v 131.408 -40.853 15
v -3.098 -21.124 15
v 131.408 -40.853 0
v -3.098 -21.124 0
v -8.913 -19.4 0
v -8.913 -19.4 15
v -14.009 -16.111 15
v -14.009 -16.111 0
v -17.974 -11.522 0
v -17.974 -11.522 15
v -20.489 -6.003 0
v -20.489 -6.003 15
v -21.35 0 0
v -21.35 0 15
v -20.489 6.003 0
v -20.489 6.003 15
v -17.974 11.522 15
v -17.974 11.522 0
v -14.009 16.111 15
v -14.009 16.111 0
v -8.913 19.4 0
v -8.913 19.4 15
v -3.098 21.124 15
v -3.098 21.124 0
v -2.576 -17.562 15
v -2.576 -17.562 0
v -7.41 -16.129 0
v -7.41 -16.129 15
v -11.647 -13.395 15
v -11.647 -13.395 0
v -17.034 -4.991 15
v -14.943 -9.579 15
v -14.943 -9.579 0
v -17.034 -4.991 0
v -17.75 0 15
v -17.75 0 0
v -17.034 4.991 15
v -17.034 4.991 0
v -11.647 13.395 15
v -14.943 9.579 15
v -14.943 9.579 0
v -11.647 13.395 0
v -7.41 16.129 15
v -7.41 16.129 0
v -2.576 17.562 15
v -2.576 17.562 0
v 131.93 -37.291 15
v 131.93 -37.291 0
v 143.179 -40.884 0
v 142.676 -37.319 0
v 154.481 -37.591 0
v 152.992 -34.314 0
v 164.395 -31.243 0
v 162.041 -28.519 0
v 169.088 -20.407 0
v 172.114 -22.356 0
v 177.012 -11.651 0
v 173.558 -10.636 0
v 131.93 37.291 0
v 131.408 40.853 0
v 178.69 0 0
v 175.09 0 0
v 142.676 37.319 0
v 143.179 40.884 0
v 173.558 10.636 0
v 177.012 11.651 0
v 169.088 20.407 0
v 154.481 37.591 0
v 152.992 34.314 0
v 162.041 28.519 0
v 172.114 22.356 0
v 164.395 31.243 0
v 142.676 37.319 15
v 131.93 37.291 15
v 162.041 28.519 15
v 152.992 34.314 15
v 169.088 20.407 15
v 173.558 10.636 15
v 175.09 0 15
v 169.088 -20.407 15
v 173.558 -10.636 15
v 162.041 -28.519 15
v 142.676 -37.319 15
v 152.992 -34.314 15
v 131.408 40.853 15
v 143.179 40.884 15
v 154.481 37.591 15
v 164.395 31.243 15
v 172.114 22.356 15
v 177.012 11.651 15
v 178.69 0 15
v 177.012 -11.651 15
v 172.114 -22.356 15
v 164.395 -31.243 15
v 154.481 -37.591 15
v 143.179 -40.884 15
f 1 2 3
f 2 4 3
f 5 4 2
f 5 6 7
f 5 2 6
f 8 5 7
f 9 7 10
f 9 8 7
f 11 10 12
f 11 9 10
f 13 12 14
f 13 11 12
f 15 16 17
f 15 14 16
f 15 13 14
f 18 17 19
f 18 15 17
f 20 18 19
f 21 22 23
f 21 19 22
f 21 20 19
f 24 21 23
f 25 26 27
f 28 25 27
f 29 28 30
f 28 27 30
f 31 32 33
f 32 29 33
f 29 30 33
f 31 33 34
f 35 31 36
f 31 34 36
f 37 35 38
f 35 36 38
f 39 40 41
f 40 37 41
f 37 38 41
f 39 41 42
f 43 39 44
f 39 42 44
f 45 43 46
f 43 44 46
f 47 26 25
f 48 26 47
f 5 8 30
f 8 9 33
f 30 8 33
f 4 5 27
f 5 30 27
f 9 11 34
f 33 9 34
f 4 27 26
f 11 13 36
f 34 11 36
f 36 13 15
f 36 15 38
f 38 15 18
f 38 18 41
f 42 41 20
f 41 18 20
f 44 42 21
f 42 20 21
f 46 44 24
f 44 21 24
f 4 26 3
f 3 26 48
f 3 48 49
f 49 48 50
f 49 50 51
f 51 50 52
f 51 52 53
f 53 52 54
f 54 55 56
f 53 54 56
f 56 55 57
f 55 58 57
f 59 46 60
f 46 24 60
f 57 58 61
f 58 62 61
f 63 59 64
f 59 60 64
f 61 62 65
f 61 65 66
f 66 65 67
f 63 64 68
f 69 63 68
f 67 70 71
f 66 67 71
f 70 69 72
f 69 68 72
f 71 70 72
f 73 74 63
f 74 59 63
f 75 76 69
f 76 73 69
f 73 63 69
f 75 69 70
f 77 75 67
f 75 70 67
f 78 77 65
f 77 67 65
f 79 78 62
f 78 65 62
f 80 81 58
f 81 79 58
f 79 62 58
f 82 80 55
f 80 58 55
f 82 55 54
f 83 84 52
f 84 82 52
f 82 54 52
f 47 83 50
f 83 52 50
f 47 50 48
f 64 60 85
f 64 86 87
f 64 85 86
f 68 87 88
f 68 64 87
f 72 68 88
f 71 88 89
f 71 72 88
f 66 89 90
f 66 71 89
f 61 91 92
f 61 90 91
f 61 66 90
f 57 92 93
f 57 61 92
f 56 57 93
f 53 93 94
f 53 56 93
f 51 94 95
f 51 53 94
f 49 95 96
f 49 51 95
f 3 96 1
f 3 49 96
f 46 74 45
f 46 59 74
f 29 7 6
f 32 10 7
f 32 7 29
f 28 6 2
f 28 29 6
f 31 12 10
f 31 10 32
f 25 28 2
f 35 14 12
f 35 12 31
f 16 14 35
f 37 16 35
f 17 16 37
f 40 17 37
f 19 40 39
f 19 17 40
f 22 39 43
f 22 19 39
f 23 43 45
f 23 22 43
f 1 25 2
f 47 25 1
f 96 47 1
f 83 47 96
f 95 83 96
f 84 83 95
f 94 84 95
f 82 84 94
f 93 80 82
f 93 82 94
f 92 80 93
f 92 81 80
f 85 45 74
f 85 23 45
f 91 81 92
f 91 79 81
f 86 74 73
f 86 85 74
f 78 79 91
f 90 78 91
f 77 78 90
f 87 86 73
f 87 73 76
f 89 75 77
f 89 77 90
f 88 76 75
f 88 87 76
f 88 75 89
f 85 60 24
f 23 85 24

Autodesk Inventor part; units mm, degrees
ref_plane "YZ Plane" through (0, 0, 0) normal (1, 0, 0) x (0, 1, 0)
ref_plane "XZ Plane" through (0, 0, 0) normal (0, 1, 0) x (-1, 0, 0)
ref_plane "XY Plane" through (0, 0, 0) normal (0, 0, 1) x (1, 0, 0)
sketch "Sketch1" plane through (0, 0, 0) normal (0, 0, 1) x (1, 0, 0)
  arc A0 (-2.8807, 19.6399) -> (-2.8807, -19.6399) centre (0, 0) ccw
  arc A1 (131.6255, -39.3688) -> (131.6255, 39.3688) centre (137.4, 0) ccw
  line L0 (0, 0) -> (137.4, 0)
  line L1 (0, 0) -> (137.4, 0) construction
  line L2 (-2.8807, 19.6399) -> (131.6255, 39.3688)
  line L3 (-2.8807, -19.6399) -> (131.6255, -39.3688)
  arc A2 (131.9303, -37.291) -> (131.9303, 37.291) centre (137.4, 0) ccw
  line L4 (131.9303, 37.291) -> (-2.5759, 17.5621)
  arc A3 (-2.5759, 17.5621) -> (-2.5759, -17.5621) centre (0, 0) ccw
  line L5 (-2.5759, -17.5621) -> (131.9303, -37.291)
  arc A4 (131.4078, -40.8529) -> (131.4078, 40.8529) centre (137.4, 0) ccw
  line L6 (131.4078, 40.8529) -> (-3.0984, 21.124)
  arc A5 (-3.0984, 21.124) -> (-3.0984, -21.124) centre (0, 0) ccw
  line L7 (-3.0984, -21.124) -> (131.4078, -40.8529)
  dimension "d0" = 39.7
  dimension "d1" = 79.58
  dimension "d2" = 137.4
  dimension "d3" = 0
  dimension "d4" = 2.1
  dimension "d5" = 1.5
extrude "Extrusion1" add sketch "Sketch1" along normal blind 15 contours L2 A1 L3 A0 | L7 A5 L6 A4
properties part number "HTD5M 93 Belt" material "Rubber"
